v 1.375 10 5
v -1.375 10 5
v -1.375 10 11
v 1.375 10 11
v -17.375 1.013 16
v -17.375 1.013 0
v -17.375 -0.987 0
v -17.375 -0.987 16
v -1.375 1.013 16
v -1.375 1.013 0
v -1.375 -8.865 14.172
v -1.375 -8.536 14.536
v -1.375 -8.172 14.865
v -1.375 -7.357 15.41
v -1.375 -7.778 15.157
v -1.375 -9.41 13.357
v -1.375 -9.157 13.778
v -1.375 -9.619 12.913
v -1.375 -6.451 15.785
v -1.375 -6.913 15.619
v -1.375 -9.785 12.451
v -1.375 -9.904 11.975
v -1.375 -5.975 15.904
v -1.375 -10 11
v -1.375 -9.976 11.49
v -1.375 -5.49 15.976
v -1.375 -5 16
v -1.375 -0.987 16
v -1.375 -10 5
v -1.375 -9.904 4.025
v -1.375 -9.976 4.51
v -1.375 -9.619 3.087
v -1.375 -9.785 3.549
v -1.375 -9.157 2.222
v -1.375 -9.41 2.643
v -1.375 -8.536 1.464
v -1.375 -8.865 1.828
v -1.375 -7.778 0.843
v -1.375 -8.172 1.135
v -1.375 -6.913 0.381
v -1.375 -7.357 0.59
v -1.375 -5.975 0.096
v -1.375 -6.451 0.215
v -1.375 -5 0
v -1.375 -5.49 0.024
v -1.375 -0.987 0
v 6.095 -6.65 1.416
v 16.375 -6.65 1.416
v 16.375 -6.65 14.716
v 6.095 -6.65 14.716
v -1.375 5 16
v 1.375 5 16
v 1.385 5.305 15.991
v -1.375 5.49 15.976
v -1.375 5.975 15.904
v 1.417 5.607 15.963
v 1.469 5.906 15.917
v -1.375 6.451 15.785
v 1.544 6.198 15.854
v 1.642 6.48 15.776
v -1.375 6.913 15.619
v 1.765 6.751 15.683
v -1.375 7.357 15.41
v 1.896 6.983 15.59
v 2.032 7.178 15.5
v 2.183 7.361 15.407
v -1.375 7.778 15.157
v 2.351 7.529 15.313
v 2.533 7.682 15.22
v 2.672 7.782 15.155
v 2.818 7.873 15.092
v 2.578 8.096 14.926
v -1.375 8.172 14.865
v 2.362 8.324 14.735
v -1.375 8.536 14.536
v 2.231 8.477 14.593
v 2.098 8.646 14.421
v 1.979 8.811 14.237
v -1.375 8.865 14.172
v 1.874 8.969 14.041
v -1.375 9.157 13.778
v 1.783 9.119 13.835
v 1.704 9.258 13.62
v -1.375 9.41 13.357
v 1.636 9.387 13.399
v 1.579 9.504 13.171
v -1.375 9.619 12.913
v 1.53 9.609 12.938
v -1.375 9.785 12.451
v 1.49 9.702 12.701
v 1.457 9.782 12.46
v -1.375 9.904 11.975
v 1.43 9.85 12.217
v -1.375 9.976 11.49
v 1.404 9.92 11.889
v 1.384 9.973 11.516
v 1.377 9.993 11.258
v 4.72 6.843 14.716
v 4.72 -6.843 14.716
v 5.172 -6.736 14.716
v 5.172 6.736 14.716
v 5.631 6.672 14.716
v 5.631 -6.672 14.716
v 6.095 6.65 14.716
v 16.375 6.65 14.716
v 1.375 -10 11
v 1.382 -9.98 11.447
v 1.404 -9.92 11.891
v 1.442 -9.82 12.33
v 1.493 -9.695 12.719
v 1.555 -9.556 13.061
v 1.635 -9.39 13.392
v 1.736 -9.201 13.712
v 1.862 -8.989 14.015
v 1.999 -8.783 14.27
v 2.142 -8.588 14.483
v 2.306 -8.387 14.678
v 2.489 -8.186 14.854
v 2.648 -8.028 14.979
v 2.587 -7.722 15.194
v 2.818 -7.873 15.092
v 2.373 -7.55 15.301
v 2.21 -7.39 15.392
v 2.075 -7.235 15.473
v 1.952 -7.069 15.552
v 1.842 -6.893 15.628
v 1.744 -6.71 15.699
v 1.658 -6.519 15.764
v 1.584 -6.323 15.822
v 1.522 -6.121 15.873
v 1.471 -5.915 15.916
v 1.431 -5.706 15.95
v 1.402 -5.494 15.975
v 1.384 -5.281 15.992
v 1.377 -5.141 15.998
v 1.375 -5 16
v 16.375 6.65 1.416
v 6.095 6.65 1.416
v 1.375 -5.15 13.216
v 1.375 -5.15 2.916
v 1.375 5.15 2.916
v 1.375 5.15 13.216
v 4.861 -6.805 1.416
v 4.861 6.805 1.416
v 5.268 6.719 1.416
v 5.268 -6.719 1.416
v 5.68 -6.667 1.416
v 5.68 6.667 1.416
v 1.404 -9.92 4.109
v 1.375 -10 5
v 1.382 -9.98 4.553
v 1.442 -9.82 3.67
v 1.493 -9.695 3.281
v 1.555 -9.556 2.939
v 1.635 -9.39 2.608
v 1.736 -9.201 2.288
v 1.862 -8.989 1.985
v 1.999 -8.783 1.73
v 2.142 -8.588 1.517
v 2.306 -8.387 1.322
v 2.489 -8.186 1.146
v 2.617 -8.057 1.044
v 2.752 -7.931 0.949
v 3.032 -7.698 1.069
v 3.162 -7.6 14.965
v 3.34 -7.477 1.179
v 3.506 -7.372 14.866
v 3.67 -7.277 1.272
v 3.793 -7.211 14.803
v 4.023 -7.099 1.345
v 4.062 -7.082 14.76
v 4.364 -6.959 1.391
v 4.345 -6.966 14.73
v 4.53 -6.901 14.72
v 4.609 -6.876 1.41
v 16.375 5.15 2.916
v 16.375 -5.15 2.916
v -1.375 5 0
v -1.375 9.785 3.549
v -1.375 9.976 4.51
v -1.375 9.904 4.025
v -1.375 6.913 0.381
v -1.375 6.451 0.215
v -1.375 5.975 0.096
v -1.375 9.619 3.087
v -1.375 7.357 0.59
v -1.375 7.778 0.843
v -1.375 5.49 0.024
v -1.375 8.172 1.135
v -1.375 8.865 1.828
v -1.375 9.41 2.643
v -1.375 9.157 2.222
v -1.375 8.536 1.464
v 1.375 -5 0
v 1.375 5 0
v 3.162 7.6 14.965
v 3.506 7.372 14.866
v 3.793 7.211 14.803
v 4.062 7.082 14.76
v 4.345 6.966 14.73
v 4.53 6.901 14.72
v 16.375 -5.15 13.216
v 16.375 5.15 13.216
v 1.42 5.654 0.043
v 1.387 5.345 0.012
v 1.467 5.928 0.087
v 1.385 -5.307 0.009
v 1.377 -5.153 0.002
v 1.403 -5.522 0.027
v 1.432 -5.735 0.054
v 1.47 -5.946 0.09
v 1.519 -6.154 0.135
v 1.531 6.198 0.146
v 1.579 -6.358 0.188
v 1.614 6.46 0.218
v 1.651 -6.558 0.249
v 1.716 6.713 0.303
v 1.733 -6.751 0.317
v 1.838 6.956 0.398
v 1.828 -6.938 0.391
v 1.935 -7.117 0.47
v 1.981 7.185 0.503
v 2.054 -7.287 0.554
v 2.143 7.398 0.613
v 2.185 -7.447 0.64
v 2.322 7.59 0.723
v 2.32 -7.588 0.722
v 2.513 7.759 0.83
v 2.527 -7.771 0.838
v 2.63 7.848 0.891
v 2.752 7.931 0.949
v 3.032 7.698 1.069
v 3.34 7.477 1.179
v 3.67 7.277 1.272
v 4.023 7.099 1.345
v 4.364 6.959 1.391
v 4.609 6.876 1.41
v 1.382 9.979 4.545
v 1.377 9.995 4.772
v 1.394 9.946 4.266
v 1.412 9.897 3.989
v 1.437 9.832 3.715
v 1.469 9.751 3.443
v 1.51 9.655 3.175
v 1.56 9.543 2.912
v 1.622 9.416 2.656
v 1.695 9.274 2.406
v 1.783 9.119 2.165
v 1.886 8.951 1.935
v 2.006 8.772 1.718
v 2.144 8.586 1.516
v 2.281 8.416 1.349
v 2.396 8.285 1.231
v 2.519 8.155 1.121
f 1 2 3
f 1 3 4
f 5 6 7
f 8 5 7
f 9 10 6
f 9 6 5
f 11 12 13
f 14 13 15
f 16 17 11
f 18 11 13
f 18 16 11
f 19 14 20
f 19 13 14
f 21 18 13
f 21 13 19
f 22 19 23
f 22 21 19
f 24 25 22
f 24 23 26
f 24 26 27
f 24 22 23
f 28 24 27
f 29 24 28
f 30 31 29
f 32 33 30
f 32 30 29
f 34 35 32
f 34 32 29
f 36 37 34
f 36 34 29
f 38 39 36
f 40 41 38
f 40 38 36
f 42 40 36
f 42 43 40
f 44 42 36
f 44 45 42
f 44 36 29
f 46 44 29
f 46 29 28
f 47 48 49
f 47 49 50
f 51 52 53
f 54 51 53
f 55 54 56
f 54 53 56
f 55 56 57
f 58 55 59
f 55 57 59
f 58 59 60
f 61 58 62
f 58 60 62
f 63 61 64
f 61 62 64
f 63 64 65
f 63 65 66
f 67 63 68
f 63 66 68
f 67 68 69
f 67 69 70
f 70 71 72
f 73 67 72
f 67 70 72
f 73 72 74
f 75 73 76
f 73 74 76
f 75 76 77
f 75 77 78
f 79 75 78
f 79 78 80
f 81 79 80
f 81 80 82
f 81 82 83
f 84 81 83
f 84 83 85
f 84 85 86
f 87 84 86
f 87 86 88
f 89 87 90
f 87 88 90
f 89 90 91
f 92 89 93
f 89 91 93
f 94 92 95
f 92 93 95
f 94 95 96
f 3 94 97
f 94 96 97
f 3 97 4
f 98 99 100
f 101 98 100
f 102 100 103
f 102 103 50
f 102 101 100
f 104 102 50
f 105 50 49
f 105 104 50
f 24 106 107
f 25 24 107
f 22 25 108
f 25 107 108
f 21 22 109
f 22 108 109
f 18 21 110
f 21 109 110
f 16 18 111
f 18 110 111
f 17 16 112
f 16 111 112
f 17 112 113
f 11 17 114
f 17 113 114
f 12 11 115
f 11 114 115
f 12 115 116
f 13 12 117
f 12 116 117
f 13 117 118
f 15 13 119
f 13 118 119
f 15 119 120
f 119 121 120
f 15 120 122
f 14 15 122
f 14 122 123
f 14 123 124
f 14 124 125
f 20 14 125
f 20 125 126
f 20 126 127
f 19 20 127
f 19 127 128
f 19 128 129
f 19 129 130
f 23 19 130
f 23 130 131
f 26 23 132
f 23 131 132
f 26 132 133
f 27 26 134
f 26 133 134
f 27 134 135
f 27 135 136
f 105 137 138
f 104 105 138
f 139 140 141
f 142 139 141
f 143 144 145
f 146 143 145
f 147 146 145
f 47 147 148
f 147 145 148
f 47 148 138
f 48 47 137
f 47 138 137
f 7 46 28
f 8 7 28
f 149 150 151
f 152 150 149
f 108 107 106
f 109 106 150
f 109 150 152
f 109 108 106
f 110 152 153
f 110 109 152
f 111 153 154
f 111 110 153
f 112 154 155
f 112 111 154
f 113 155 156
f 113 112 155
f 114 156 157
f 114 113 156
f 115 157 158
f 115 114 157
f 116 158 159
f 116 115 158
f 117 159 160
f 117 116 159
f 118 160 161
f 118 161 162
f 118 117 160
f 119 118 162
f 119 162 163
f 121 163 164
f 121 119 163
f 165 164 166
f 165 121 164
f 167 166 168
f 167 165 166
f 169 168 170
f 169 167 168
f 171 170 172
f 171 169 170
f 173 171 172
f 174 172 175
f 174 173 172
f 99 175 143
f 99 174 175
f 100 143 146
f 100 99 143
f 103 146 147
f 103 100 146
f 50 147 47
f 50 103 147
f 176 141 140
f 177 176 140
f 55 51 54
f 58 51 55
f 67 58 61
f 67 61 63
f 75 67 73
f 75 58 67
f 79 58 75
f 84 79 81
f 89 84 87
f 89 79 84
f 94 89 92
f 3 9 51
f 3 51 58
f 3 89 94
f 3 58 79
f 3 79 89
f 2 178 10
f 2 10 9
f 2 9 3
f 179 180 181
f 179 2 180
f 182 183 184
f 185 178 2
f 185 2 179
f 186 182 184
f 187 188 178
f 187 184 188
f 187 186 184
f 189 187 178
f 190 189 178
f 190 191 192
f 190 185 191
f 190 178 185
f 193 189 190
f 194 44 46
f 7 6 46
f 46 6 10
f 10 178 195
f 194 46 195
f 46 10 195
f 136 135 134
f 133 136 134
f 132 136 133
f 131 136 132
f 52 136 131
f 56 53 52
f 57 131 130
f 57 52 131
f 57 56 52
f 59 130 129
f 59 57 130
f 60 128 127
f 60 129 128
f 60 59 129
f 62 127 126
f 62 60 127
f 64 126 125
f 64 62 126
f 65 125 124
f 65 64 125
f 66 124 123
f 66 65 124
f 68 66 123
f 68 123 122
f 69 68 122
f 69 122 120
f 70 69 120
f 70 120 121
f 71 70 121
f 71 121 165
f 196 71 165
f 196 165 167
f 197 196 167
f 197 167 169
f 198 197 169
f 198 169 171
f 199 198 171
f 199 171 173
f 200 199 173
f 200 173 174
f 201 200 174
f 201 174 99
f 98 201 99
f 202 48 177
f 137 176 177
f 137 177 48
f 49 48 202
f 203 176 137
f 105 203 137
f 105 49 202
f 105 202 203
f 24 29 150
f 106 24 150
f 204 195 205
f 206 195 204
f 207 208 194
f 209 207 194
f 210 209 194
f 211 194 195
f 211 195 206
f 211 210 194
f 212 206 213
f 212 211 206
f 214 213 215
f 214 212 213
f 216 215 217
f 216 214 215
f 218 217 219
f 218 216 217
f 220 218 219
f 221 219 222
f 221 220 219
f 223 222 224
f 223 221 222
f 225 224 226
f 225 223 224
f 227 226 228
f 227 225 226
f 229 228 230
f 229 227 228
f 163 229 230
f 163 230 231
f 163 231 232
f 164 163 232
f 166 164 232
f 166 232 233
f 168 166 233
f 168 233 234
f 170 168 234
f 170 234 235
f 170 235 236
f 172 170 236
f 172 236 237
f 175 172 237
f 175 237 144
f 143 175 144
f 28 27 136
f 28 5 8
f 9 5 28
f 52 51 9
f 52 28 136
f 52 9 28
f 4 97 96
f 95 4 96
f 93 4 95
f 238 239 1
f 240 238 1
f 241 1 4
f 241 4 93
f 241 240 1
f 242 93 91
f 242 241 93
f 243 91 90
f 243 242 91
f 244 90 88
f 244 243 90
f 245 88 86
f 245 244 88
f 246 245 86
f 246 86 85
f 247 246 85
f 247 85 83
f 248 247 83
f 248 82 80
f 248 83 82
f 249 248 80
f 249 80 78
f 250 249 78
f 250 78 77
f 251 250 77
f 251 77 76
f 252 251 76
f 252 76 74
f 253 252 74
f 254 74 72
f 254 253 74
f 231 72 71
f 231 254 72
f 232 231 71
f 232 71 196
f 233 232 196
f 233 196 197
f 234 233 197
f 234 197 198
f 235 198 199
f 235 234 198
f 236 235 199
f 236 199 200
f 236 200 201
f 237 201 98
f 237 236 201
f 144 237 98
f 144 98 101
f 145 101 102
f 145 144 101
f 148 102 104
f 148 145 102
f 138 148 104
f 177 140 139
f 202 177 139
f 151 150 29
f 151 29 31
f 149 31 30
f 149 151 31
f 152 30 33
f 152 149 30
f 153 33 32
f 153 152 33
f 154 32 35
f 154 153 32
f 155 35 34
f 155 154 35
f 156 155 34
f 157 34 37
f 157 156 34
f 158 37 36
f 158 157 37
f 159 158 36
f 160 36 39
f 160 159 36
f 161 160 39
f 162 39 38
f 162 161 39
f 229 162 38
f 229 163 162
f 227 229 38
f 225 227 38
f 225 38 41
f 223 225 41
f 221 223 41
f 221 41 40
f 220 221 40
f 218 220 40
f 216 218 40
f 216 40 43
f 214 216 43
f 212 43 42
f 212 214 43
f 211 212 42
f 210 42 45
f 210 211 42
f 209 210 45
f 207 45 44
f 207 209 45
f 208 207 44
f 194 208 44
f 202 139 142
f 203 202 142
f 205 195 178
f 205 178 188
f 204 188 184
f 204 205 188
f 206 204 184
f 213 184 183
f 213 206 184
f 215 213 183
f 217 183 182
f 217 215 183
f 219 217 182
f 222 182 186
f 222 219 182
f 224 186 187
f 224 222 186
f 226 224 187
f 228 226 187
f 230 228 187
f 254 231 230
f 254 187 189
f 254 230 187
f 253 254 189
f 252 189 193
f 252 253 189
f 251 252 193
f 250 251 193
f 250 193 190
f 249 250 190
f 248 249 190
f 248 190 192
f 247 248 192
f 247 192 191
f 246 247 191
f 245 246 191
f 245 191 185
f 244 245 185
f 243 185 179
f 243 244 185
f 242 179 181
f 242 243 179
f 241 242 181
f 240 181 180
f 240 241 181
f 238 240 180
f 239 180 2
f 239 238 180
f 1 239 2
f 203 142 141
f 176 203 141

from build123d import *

# Parameters (mm, degrees)
F0_W         = 2.75
F0_H         = 20
F1_DEPTH     = 16
F2_W         = 5.15
F2_H         = 10.3
F3_DEPTH     = 2.75
F4_DEPTH     = 15
F5_T1_DEPTH  = 13.2999992773
F5_T3_DEPTH  = 13.2999992773
F5_T9_DEPTH  = 21.6634917276
F5_T14_DEPTH = 25.0997612432
F5_T22_DEPTH = 21.6634917276
F5_T27_DEPTH = 25.0997612432
F5_T35_DEPTH = 22.0158699277
F5_T40_DEPTH = 25.0997612432
F5_T48_DEPTH = 25.0997612432
F5_T53_DEPTH = 22.0158699277
F6_R         = 5
F7_W         = 2
F7_H         = 16
F8_DEPTH     = 16


# Not quite as in the source:
# - a fillet or chamfer that OpenCascade refuses, or shapes differently, is made with other operations: its cross-section is extruded or revolved along the edge and cut away or added
# - a feature names something its author has since deleted; it is built from what else it names


with BuildPart() as f1:
    # F0 (on Top) → F1 (new body)
    with BuildSketch(Plane.XY):
        Rectangle(F0_W, F0_H)
    extrude(amount=F1_DEPTH)

    # F2 (on face) → F3 (join)
    with BuildSketch(Plane.YZ.offset(1.375)):
        Polygon((0, 16), (-10, 16), (-10, 0), (0, 0), (0, 1.4159553841), (-6.6499996386, 1.4159553841), (-6.6499996386, 14.7159546614), (0, 14.7159546614), align=None)
        Polygon((10, 16), (0, 16), (0, 14.7159546614), (6.6499996386, 14.7159546614), (6.6499996386, 1.4159553841), (0, 1.4159553841), (0, 0), (10, 0), align=None)
        with Locations((-2.575, 8.0659550227)):
            Rectangle(F2_W, F2_H)
        with Locations((2.575, 8.0659550227)):
            Rectangle(F2_W, F2_H)
        Polygon((0, 13.2159550227), (0, 14.7159546614), (-6.6499996386, 14.7159546614), (-6.6499996386, 1.4159553841), (0, 1.4159553841), (0, 2.9159550227), (-5.15, 2.9159550227), (-5.15, 13.2159550227), align=None)
        Polygon((6.6499996386, 14.7159546614), (0, 14.7159546614), (0, 13.2159550227), (5.15, 13.2159550227), (5.15, 2.9159550227), (0, 2.9159550227), (0, 1.4159553841), (6.6499996386, 1.4159553841), align=None)
    extrude(amount=-F3_DEPTH)

    # F2 (on face) → F4 (join)
    with BuildSketch(Plane.YZ.offset(1.375)):
        Polygon((0, 13.2159550227), (0, 14.7159546614), (-6.6499996386, 14.7159546614), (-6.6499996386, 1.4159553841), (0, 1.4159553841), (0, 2.9159550227), (-5.15, 2.9159550227), (-5.15, 13.2159550227), align=None)
        Polygon((6.6499996386, 14.7159546614), (0, 14.7159546614), (0, 13.2159550227), (5.15, 13.2159550227), (5.15, 2.9159550227), (0, 2.9159550227), (0, 1.4159553841), (6.6499996386, 1.4159553841), align=None)
    extrude(amount=F4_DEPTH)

    # F5: fillet of radius 5 on 6 edges, made by hand

    # F5_s2 → F5_t1 (join)
    with BuildSketch(Plane.XZ.offset(-6.6499996386)):
        with BuildLine():
            ThreePointArc((1.375, 16), (2.9287180617, 15.0479907955), (4.7203969801, 14.7159546614))
            Line((4.7203969801, 14.7159546614), (1.375, 14.7159546614))
            Line((1.375, 14.7159546614), (1.375, 16))
        make_face()
        with BuildLine():
            ThreePointArc((1.375, 0), (2.9798891295, 1.0484613517), (4.8613482602, 1.4159553841))
            Line((4.8613482602, 1.4159553841), (1.375, 1.4159553841))
            Line((1.375, 1.4159553841), (1.375, 0))
        make_face()
    extrude(amount=F5_T1_DEPTH)

    # F5_s4 → F5_t3 (join)
    with BuildSketch(Plane.XY.offset(1.4159553841)):
        with BuildLine():
            ThreePointArc((1.375, -10), (3.2009454046, -7.5726231419), (6.0949047864, -6.6499996386))
            Line((6.0949047864, -6.6499996386), (1.375, -6.6499996386))
            Line((1.375, -6.6499996386), (1.375, -10))
        make_face()
        with BuildLine():
            ThreePointArc((1.375, 10), (3.2009454046, 7.5726231419), (6.0949047864, 6.6499996386))
            Line((6.0949047864, 6.6499996386), (1.375, 6.6499996386))
            Line((1.375, 6.6499996386), (1.375, 10))
        make_face()
    extrude(amount=F5_T3_DEPTH)


with BuildPart() as f5_tool7:
    # F5_s8 → F5_t9 (new body)
    with BuildSketch(Plane.XZ.offset(-15.013492089)):
        with BuildLine():
            ThreePointArc((1.375, 16), (2.9287180617, 15.0479907955), (4.7203969801, 14.7159546614))
            Line((4.7203969801, 14.7159546614), (1.375, 14.7159546614))
            Line((1.375, 14.7159546614), (1.375, 16))
        make_face()
    extrude(amount=F5_T9_DEPTH)

    split(bisect_by=Plane.XZ.offset(-10), keep=Keep.TOP)

    split(bisect_by=Plane.XZ.offset(-6.6499996386), keep=Keep.BOTTOM)


with BuildPart() as f5_tool12:
    # F5_s13 → F5_t14 (new body)
    with BuildSketch(Plane.XY.offset(1.4159553841)):
        with BuildLine():
            ThreePointArc((1.375, 10), (3.2009454046, 7.5726231419), (6.0949047864, 6.6499996386))
            Line((6.0949047864, 6.6499996386), (1.375, 6.6499996386))
            Line((1.375, 6.6499996386), (1.375, 10))
        make_face()
    extrude(amount=F5_T14_DEPTH)

    split(bisect_by=Plane.XY.offset(16), keep=Keep.BOTTOM)

    split(bisect_by=Plane.XY.offset(14.7159546614), keep=Keep.TOP)


with BuildPart() as f5_tool7_1:
    add(f5_tool7.part)

    # F5_t17: intersect F5_tool12
    add(f5_tool12.part, mode=Mode.INTERSECT)


with BuildPart() as f1_1:
    add(f1.part)

    # F5_t5: union F5_tool7
    add(f5_tool7_1.part)


with BuildPart() as f5_tool20:
    # F5_s21 → F5_t22 (new body)
    with BuildSketch(Plane.XZ.offset(-6.6499996386)):
        with BuildLine():
            ThreePointArc((1.375, 16), (2.9287180617, 15.0479907955), (4.7203969801, 14.7159546614))
            Line((4.7203969801, 14.7159546614), (1.375, 14.7159546614))
            Line((1.375, 14.7159546614), (1.375, 16))
        make_face()
    extrude(amount=F5_T22_DEPTH)

    split(bisect_by=Plane.XZ.offset(10), keep=Keep.BOTTOM)

    split(bisect_by=Plane.XZ.offset(6.6499996386), keep=Keep.TOP)


with BuildPart() as f5_tool25:
    # F5_s26 → F5_t27 (new body)
    with BuildSketch(Plane.XY.offset(26.5157166273)):
        with BuildLine():
            ThreePointArc((1.375, -10), (3.2009454046, -7.5726231419), (6.0949047864, -6.6499996386))
            Line((6.0949047864, -6.6499996386), (1.375, -6.6499996386))
            Line((1.375, -6.6499996386), (1.375, -10))
        make_face()
    extrude(amount=-F5_T27_DEPTH)

    split(bisect_by=Plane.XY.offset(16), keep=Keep.BOTTOM)

    split(bisect_by=Plane.XY.offset(14.7159546614), keep=Keep.TOP)


with BuildPart() as f5_tool20_1:
    add(f5_tool20.part)

    # F5_t30: intersect F5_tool25
    add(f5_tool25.part, mode=Mode.INTERSECT)


with BuildPart() as f1_2:
    add(f1_1.part)

    # F5_t18: union F5_tool20
    add(f5_tool20_1.part)


with BuildPart() as f5_tool33:
    # F5_s34 → F5_t35 (new body)
    with BuildSketch(Plane.XZ.offset(15.365870289)):
        with BuildLine():
            ThreePointArc((1.375, 0), (2.9798891295, 1.0484613517), (4.8613482602, 1.4159553841))
            Line((4.8613482602, 1.4159553841), (1.375, 1.4159553841))
            Line((1.375, 1.4159553841), (1.375, 0))
        make_face()
    extrude(amount=-F5_T35_DEPTH)

    split(bisect_by=Plane.XZ.offset(10), keep=Keep.BOTTOM)

    split(bisect_by=Plane.XZ.offset(6.6499996386), keep=Keep.TOP)


with BuildPart() as f5_tool38:
    # F5_s39 → F5_t40 (new body)
    with BuildSketch(Plane.XY.offset(14.7159546614)):
        with BuildLine():
            ThreePointArc((1.375, -10), (3.2009454046, -7.5726231419), (6.0949047864, -6.6499996386))
            Line((6.0949047864, -6.6499996386), (1.375, -6.6499996386))
            Line((1.375, -6.6499996386), (1.375, -10))
        make_face()
    extrude(amount=-F5_T40_DEPTH)

    split(bisect_by=Plane.XY, keep=Keep.TOP)

    split(bisect_by=Plane.XY.offset(1.4159553841), keep=Keep.BOTTOM)


with BuildPart() as f5_tool33_1:
    add(f5_tool33.part)

    # F5_t43: intersect F5_tool38
    add(f5_tool38.part, mode=Mode.INTERSECT)


with BuildPart() as f1_3:
    add(f1_2.part)

    # F5_t31: union F5_tool33
    add(f5_tool33_1.part)


with BuildPart() as f5_tool46:
    # F5_s47 → F5_t48 (new body)
    with BuildSketch(Plane.XY.offset(-10.3838065819)):
        with BuildLine():
            ThreePointArc((1.375, 10), (3.2009454046, 7.5726231419), (6.0949047864, 6.6499996386))
            Line((6.0949047864, 6.6499996386), (1.375, 6.6499996386))
            Line((1.375, 6.6499996386), (1.375, 10))
        make_face()
    extrude(amount=F5_T48_DEPTH)

    split(bisect_by=Plane.XY, keep=Keep.TOP)

    split(bisect_by=Plane.XY.offset(1.4159553841), keep=Keep.BOTTOM)


with BuildPart() as f5_tool51:
    # F5_s52 → F5_t53 (new body)
    with BuildSketch(Plane.XZ.offset(6.6499996386)):
        with BuildLine():
            ThreePointArc((1.375, 0), (2.9798891295, 1.0484613517), (4.8613482602, 1.4159553841))
            Line((4.8613482602, 1.4159553841), (1.375, 1.4159553841))
            Line((1.375, 1.4159553841), (1.375, 0))
        make_face()
    extrude(amount=-F5_T53_DEPTH)

    split(bisect_by=Plane.XZ.offset(-10), keep=Keep.TOP)

    split(bisect_by=Plane.XZ.offset(-6.6499996386), keep=Keep.BOTTOM)


with BuildPart() as f5_tool46_1:
    add(f5_tool46.part)

    # F5_t56: intersect F5_tool51
    add(f5_tool51.part, mode=Mode.INTERSECT)


with BuildPart() as f1_4:
    add(f1_3.part)

    # F5_t44: union F5_tool46
    add(f5_tool46_1.part)

    # F6
    f6_edges = [f1_4.edges().sort_by_distance(p)[0] for p in [
        (0, -10, 0),
        (0, -10, 16),
        (0, 10, 16),
        (0, 10, 0),
    ]]
    fillet(f6_edges, radius=F6_R)

    # F7 (on face) → F8 (join)
    with BuildSketch(Plane(origin=(-1.375, 0, 0), x_dir=(0, -1, 0), z_dir=(-1, 0, 0))):
        with Locations((-0.0132987518, 8)):
            Rectangle(F7_W, F7_H)
    extrude(amount=F8_DEPTH)


solid = f1_4.part
